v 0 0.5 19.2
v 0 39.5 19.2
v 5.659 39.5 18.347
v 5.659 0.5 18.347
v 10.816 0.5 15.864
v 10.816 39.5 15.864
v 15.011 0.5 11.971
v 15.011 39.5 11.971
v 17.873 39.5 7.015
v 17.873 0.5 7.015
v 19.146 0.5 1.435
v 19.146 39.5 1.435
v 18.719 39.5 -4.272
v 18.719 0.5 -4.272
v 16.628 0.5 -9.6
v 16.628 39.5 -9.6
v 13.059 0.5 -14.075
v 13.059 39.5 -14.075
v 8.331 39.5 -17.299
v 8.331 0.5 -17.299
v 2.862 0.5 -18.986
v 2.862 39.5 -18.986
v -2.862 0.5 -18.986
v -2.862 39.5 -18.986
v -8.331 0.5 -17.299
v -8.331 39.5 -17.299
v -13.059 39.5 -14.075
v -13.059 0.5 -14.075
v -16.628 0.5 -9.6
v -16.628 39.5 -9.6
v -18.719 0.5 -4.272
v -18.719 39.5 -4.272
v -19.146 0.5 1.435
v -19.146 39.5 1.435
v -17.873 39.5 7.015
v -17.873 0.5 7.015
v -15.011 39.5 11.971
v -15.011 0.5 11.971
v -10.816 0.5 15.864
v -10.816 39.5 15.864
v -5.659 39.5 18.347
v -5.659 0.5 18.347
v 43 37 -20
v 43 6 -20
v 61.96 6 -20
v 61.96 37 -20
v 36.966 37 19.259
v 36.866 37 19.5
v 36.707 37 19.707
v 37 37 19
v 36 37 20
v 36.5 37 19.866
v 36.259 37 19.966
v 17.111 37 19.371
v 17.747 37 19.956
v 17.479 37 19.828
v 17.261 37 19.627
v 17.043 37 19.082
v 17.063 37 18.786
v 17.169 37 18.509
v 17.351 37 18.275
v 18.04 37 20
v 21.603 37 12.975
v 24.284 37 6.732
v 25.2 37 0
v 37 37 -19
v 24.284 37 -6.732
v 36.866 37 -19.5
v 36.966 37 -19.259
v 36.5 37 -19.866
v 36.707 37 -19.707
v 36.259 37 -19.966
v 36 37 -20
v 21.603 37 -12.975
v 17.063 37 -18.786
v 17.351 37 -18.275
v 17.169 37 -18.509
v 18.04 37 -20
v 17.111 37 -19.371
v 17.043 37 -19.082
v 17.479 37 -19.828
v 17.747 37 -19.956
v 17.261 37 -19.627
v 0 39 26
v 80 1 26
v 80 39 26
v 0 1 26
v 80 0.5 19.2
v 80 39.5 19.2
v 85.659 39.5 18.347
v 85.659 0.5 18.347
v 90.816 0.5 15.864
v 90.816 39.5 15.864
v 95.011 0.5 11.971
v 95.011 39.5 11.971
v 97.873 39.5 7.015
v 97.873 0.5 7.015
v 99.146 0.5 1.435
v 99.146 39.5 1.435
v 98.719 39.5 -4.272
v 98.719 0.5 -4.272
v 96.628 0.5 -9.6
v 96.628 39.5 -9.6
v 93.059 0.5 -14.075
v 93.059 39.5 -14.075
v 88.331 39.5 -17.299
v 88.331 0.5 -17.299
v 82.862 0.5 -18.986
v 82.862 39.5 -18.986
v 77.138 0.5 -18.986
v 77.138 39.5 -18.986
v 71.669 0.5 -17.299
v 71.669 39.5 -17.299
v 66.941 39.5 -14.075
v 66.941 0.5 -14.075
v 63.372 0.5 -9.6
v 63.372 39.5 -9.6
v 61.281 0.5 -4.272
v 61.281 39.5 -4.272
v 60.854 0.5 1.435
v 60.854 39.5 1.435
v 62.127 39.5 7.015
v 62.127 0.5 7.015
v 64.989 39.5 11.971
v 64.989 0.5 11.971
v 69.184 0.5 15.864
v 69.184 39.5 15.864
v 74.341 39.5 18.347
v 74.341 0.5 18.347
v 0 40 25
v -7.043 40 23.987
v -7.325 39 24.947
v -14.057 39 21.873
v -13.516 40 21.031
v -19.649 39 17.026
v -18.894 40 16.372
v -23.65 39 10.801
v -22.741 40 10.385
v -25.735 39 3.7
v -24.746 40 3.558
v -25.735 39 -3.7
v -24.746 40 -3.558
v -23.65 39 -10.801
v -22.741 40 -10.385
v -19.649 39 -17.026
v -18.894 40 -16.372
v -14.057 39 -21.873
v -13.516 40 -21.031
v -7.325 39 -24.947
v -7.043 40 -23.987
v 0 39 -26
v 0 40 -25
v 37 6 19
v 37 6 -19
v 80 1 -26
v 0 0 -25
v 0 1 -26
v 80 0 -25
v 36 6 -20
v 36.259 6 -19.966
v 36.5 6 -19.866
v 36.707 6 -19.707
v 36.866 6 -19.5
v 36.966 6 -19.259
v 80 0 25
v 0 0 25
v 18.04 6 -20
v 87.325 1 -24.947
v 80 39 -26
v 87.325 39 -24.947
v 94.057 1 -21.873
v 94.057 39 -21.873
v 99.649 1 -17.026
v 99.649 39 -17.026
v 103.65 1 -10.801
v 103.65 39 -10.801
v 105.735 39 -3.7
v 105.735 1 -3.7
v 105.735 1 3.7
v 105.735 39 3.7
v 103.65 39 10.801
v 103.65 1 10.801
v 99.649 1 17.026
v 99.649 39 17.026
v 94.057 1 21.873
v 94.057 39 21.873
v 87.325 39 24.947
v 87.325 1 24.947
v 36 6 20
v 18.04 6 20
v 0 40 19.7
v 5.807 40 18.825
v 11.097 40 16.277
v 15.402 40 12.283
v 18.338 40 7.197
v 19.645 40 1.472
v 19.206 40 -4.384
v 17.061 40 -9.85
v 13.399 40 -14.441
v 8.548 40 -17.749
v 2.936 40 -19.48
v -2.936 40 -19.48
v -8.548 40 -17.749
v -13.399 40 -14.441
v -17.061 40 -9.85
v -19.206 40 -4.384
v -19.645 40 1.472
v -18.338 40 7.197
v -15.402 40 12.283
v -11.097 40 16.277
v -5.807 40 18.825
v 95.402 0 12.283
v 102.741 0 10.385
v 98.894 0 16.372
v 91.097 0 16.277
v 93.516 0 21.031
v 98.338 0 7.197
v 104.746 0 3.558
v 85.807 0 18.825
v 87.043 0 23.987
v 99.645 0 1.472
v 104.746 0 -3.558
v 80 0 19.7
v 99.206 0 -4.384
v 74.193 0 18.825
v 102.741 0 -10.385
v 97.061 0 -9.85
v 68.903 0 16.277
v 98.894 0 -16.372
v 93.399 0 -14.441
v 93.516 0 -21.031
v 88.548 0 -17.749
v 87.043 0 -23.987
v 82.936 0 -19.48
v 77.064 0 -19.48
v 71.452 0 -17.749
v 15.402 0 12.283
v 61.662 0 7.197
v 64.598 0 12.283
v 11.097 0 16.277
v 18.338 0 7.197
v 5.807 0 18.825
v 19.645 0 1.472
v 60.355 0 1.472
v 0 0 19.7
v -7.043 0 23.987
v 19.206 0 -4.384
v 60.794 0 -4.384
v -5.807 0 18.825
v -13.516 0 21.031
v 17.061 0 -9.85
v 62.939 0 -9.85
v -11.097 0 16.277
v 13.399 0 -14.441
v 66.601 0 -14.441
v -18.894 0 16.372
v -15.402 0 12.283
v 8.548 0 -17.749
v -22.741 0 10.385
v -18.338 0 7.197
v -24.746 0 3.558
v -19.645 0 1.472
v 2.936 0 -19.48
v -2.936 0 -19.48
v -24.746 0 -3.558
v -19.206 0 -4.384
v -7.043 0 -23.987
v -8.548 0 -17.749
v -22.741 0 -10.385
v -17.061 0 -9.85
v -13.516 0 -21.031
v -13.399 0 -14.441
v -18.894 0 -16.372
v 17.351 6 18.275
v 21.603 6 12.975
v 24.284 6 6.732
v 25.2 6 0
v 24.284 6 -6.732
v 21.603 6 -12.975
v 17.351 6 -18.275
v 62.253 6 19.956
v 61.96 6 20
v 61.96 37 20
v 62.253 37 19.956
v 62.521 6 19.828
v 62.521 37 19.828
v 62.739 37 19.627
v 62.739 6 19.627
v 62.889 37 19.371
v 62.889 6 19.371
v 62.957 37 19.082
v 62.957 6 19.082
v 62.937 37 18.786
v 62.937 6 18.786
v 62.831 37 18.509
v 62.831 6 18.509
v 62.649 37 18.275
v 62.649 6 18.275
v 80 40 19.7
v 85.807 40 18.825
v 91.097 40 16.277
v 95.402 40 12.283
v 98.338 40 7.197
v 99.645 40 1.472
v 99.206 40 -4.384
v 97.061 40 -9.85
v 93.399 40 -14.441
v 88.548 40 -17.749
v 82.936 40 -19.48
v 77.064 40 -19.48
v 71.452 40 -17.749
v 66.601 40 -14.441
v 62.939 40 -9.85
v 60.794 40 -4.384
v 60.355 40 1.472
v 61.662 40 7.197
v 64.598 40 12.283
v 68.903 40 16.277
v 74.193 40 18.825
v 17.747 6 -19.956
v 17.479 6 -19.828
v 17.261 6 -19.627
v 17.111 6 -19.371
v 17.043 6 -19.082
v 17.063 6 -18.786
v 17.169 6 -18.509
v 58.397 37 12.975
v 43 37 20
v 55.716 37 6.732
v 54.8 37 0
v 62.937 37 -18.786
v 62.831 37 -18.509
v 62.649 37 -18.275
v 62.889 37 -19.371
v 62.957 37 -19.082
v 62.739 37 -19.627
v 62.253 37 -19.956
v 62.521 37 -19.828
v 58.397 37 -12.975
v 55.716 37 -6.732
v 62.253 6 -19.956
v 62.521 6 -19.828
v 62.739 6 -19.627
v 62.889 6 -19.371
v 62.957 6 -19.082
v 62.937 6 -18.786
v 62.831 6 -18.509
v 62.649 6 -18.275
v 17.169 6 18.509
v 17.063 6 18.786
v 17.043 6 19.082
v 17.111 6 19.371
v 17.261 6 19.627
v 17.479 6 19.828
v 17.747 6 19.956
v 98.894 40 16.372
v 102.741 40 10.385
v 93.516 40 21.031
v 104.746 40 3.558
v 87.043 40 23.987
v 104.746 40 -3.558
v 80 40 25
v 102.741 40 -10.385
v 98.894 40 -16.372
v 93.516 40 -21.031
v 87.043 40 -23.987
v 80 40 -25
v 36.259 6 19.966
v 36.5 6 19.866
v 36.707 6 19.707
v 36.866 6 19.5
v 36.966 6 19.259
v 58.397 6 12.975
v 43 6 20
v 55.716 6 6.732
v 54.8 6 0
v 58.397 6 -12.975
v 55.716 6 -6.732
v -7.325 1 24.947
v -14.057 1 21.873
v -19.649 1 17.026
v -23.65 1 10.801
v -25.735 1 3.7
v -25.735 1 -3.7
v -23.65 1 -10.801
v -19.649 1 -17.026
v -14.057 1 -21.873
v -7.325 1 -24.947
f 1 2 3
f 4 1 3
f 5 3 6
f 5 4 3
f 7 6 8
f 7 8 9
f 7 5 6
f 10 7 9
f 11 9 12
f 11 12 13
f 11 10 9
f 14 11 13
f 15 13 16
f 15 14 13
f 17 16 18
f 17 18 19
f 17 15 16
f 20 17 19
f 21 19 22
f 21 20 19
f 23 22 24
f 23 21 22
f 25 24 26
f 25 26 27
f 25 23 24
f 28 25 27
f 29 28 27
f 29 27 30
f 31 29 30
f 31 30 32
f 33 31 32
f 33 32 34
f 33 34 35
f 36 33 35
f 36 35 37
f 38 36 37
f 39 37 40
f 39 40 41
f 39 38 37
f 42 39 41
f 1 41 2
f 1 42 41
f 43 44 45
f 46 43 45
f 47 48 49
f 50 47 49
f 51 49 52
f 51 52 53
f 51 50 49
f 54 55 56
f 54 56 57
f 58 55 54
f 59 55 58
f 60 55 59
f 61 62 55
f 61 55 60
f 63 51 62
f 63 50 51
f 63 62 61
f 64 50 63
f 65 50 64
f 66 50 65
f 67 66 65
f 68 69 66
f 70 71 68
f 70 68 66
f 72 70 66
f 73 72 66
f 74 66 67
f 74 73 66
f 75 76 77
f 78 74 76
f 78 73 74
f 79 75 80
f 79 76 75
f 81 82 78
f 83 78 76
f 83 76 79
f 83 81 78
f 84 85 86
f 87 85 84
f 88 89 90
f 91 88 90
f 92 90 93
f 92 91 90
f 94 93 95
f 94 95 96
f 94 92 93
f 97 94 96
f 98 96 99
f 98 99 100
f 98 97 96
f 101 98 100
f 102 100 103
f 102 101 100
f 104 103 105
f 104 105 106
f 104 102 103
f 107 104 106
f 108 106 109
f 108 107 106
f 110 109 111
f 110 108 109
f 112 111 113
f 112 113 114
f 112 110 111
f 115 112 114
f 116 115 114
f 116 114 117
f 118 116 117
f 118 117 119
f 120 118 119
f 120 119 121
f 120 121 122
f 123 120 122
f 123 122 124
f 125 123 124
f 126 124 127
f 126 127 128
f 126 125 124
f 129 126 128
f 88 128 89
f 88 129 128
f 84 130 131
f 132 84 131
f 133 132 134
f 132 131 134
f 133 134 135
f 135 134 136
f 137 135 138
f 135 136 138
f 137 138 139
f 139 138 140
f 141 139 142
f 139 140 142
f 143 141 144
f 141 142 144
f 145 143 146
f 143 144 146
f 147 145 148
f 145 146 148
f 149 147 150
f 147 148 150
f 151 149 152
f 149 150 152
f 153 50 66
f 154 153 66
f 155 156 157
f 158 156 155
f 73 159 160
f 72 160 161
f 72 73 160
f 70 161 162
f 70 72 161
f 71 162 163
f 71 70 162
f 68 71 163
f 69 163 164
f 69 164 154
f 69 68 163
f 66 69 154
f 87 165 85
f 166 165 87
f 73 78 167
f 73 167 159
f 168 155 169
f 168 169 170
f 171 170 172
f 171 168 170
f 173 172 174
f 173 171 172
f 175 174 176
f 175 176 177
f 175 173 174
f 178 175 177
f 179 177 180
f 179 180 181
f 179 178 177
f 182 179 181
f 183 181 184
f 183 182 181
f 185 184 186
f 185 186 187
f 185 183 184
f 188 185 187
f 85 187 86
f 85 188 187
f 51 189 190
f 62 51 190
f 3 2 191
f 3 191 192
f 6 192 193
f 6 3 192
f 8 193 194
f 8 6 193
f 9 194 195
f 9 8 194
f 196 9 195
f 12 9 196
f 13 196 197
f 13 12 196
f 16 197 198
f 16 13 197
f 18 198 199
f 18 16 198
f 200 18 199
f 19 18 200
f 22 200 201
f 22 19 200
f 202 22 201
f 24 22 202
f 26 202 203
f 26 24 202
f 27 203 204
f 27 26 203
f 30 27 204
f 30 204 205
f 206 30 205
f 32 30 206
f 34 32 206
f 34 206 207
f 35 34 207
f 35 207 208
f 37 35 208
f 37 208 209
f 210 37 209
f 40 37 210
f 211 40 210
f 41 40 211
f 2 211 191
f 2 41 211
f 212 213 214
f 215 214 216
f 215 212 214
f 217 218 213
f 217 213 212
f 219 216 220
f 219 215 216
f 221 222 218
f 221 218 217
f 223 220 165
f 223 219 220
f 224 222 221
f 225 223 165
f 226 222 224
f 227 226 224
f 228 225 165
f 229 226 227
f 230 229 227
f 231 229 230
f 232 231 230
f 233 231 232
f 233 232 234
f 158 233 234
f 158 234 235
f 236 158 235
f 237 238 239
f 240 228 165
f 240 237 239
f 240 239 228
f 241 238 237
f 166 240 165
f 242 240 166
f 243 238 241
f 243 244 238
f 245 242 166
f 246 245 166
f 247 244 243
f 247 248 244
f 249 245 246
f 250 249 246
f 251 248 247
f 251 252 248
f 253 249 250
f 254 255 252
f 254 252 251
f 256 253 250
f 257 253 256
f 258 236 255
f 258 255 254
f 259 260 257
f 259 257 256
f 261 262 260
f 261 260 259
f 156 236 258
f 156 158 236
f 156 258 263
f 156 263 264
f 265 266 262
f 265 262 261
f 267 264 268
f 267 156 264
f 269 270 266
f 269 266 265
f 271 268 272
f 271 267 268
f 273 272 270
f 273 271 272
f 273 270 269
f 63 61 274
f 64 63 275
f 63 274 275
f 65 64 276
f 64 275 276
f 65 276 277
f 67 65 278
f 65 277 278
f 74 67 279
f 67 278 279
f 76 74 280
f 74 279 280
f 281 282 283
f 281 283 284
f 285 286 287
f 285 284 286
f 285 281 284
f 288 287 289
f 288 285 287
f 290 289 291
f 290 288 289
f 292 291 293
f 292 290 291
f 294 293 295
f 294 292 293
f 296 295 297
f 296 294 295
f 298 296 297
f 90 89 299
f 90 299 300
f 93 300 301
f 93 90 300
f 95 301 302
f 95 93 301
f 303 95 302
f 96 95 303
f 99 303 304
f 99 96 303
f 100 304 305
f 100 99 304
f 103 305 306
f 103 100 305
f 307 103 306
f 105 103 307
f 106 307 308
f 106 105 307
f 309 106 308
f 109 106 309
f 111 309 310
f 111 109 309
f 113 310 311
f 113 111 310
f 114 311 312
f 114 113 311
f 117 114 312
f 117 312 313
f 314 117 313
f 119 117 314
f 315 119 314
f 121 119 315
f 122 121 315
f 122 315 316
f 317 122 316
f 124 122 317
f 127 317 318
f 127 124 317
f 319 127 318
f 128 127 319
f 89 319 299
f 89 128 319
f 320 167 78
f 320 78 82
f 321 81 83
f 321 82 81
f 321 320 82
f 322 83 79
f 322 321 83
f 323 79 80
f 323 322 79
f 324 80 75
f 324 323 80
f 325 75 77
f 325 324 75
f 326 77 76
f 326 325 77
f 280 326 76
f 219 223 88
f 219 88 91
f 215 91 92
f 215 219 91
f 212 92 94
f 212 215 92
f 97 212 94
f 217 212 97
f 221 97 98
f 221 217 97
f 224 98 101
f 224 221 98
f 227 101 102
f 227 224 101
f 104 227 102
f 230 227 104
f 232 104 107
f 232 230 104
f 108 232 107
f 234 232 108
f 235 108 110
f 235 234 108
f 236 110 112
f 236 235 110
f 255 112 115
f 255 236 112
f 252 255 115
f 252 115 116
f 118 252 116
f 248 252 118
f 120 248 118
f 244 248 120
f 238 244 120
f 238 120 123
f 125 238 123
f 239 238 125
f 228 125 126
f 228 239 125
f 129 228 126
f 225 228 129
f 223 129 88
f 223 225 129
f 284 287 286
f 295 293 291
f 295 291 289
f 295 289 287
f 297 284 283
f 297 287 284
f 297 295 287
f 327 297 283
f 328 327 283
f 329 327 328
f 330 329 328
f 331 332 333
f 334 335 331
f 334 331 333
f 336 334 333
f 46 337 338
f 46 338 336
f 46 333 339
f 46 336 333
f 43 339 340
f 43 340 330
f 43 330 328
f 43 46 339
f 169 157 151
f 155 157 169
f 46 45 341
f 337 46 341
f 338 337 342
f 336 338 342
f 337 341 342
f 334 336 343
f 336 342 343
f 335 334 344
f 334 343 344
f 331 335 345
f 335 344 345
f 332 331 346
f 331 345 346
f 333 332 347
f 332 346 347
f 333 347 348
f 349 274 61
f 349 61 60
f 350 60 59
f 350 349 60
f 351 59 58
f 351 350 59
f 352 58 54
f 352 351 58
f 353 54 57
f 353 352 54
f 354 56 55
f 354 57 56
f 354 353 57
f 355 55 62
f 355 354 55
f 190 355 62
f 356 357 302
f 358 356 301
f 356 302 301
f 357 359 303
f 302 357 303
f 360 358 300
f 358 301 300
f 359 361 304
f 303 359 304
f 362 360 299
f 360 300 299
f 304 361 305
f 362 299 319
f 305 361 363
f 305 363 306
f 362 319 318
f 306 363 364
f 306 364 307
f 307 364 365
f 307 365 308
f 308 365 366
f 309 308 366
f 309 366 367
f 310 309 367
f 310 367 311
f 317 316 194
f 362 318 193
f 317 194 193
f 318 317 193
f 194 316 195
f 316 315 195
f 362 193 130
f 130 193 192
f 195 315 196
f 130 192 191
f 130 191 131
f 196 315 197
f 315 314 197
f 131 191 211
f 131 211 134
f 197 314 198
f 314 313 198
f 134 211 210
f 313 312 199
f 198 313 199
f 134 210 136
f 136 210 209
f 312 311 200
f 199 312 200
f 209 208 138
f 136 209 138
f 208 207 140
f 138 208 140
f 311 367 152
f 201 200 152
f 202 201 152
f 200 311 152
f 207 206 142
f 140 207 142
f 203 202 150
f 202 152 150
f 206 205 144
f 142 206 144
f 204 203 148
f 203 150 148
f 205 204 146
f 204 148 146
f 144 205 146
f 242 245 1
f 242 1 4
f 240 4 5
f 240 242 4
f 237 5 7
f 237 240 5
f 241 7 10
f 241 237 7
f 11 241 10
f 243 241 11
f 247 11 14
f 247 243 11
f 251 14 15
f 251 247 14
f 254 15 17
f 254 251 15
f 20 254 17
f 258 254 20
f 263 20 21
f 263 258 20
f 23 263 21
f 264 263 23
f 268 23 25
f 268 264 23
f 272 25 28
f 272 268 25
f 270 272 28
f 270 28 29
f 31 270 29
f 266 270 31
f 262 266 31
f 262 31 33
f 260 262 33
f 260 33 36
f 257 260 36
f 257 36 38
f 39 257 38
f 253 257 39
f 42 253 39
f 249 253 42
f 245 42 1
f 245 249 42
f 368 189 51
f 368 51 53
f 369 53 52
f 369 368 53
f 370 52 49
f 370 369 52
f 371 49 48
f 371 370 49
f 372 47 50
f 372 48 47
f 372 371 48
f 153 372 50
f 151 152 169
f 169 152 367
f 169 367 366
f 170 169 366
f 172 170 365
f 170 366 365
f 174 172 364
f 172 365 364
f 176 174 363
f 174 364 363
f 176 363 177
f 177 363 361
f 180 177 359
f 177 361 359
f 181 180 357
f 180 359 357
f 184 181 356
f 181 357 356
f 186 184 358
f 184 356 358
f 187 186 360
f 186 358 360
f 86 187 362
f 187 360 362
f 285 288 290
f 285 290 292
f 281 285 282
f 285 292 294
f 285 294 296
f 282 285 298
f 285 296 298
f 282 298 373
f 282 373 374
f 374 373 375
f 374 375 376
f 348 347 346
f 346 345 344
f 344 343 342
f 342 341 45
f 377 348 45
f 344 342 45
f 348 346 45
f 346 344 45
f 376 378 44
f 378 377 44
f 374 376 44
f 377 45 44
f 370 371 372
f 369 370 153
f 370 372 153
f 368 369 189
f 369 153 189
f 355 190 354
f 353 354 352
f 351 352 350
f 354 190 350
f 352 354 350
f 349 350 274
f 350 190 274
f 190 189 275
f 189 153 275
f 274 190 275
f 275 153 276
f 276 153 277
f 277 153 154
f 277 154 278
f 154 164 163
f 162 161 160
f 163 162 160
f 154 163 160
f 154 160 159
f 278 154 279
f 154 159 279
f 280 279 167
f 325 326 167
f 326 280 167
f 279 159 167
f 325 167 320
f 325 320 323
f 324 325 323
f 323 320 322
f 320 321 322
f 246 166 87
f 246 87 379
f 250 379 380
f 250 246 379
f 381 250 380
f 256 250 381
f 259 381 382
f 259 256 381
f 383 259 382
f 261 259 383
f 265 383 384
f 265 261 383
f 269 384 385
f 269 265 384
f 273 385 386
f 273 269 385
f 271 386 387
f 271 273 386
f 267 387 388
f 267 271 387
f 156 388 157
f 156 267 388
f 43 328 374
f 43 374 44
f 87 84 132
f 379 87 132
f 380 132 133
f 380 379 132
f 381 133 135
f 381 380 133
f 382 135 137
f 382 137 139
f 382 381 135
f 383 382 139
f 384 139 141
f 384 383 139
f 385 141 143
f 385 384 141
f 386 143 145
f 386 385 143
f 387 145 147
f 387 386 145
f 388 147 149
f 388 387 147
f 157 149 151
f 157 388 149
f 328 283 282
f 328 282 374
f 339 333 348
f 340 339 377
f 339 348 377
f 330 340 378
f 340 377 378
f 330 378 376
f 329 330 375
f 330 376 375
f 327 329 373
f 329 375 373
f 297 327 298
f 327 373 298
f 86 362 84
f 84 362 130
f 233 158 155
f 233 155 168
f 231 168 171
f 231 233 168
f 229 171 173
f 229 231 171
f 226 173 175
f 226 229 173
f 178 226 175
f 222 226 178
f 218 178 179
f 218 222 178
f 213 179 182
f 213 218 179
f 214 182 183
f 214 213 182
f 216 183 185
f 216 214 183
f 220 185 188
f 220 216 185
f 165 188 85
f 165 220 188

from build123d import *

# Parameters (mm, degrees)
SKETCH1_R           = 19.2
BOSS_EXTRUDE1_DEPTH = 40
SHELL1_T            = -6
CHAMFER1_SIZE       = 1
RIB1_REACH          = 118.241
SKETCH2_WALLS_W     = 6
SKETCH2_WALLS_H     = 263.960304727
FILLET1_R           = 1
BOSS_EXTRUDE2_START = -3
BOSS_EXTRUDE2_DEPTH = 3
CHAMFER2_SIZE       = 0.5


with BuildPart() as part:
    # Sketch1 → Boss-Extrude1 (new body)
    with BuildSketch(Plane(origin=(0, 0, 0), x_dir=(1, 0, 0), z_dir=(0, 1, 0))):
        with BuildLine():
            Line((0, 26), (80, 26))
            ThreePointArc((80, 26), (106, 0), (80, -26))
            Line((80, -26), (0, -26))
            ThreePointArc((0, -26), (-26, 0), (0, 26))
        make_face()
        with Locations(Location((0, 0, 0), (0, 0, 270))):
            Circle(SKETCH1_R, mode=Mode.SUBTRACT)
        with Locations(Location((80, 0, 0), (0, 0, 270))):
            Circle(SKETCH1_R, mode=Mode.SUBTRACT)
    extrude(amount=BOSS_EXTRUDE1_DEPTH)

    # Shell1
    shell1_openings = [part.faces().sort_by_distance(p)[0] for p in [
        (40, 40, 0),
    ]]
    offset(amount=SHELL1_T, openings=shell1_openings, kind=Kind.INTERSECTION)

    # Chamfer1
    chamfer1_edges = [part.edges().sort_by_distance(p)[0] for p in [
        (106, 40, 0),
        (40, 40, -26),
        (-26, 40, 0),
        (40, 0, -26),
        (106, 0, 0),
        (40, 0, 26),
        (-26, 0, 0),
        (40, 40, 26),
    ]]
    chamfer(chamfer1_edges, length=CHAMFER1_SIZE)

    # Sketch2 walls → Rib1 (add, up to next)
    with BuildSketch(Plane(origin=(0, 40, 0), x_dir=(1, 0, 0), z_dir=(0, 1, 0)), mode=Mode.PRIVATE) as rib1_sk1:
        with Locations((40, 0.813044615)):
            Rectangle(SKETCH2_WALLS_W, SKETCH2_WALLS_H)
    rib1_tool1 = extrude(rib1_sk1.sketch, amount=-RIB1_REACH, mode=Mode.PRIVATE) - part.part
    add(rib1_tool1.solids().sort_by_distance((40, 40, -0.813044614))[0])

    # Fillet1
    fillet1_edges = [part.edges().sort_by_distance(p)[0] for p in [
        (64.668985683, 23, 20),
        (15.331014317, 23, -20),
        (15.331014317, 23, 20),
        (64.668985683, 23, -20),
        (37, 23, 20),
        (37, 23, -20),
    ]]
    fillet(fillet1_edges, radius=FILLET1_R)

    # Sketch3 → Boss-Extrude2 (add)
    with BuildSketch(Plane(origin=(0, 40, 0), x_dir=(1, 0, 0), z_dir=(0, 1, 0)).offset(BOSS_EXTRUDE2_START)):
        with BuildLine():
            Line((18.039955654, 20), (61.960044346, 20))
            ThreePointArc((61.960044346, 20), (62.888804498, 19.370681238), (62.648592272, 18.27480916))
            ThreePointArc((62.648592272, 18.27480916), (54.8, 0), (62.648592272, -18.27480916))
            ThreePointArc((62.648592272, -18.27480916), (62.888804498, -19.370681238), (61.960044346, -20))
            Line((61.960044346, -20), (18.039955654, -20))
            ThreePointArc((18.039955654, -20), (17.111195502, -19.370681238), (17.351407728, -18.27480916))
            ThreePointArc((17.351407728, -18.27480916), (25.2, 0), (17.351407728, 18.27480916))
            ThreePointArc((17.351407728, 18.27480916), (17.111195502, 19.370681238), (18.039955654, 20))
        make_face()
    extrude(amount=BOSS_EXTRUDE2_DEPTH)

    # Chamfer2
    chamfer2_edges = [part.edges().sort_by_distance(p)[0] for p in [
        (0, 0, -19.2),
        (0, 40, -19.2),
        (80, 0, -19.2),
        (80, 40, -19.2),
    ]]
    chamfer(chamfer2_edges, length=CHAMFER2_SIZE)


solid = part.part
